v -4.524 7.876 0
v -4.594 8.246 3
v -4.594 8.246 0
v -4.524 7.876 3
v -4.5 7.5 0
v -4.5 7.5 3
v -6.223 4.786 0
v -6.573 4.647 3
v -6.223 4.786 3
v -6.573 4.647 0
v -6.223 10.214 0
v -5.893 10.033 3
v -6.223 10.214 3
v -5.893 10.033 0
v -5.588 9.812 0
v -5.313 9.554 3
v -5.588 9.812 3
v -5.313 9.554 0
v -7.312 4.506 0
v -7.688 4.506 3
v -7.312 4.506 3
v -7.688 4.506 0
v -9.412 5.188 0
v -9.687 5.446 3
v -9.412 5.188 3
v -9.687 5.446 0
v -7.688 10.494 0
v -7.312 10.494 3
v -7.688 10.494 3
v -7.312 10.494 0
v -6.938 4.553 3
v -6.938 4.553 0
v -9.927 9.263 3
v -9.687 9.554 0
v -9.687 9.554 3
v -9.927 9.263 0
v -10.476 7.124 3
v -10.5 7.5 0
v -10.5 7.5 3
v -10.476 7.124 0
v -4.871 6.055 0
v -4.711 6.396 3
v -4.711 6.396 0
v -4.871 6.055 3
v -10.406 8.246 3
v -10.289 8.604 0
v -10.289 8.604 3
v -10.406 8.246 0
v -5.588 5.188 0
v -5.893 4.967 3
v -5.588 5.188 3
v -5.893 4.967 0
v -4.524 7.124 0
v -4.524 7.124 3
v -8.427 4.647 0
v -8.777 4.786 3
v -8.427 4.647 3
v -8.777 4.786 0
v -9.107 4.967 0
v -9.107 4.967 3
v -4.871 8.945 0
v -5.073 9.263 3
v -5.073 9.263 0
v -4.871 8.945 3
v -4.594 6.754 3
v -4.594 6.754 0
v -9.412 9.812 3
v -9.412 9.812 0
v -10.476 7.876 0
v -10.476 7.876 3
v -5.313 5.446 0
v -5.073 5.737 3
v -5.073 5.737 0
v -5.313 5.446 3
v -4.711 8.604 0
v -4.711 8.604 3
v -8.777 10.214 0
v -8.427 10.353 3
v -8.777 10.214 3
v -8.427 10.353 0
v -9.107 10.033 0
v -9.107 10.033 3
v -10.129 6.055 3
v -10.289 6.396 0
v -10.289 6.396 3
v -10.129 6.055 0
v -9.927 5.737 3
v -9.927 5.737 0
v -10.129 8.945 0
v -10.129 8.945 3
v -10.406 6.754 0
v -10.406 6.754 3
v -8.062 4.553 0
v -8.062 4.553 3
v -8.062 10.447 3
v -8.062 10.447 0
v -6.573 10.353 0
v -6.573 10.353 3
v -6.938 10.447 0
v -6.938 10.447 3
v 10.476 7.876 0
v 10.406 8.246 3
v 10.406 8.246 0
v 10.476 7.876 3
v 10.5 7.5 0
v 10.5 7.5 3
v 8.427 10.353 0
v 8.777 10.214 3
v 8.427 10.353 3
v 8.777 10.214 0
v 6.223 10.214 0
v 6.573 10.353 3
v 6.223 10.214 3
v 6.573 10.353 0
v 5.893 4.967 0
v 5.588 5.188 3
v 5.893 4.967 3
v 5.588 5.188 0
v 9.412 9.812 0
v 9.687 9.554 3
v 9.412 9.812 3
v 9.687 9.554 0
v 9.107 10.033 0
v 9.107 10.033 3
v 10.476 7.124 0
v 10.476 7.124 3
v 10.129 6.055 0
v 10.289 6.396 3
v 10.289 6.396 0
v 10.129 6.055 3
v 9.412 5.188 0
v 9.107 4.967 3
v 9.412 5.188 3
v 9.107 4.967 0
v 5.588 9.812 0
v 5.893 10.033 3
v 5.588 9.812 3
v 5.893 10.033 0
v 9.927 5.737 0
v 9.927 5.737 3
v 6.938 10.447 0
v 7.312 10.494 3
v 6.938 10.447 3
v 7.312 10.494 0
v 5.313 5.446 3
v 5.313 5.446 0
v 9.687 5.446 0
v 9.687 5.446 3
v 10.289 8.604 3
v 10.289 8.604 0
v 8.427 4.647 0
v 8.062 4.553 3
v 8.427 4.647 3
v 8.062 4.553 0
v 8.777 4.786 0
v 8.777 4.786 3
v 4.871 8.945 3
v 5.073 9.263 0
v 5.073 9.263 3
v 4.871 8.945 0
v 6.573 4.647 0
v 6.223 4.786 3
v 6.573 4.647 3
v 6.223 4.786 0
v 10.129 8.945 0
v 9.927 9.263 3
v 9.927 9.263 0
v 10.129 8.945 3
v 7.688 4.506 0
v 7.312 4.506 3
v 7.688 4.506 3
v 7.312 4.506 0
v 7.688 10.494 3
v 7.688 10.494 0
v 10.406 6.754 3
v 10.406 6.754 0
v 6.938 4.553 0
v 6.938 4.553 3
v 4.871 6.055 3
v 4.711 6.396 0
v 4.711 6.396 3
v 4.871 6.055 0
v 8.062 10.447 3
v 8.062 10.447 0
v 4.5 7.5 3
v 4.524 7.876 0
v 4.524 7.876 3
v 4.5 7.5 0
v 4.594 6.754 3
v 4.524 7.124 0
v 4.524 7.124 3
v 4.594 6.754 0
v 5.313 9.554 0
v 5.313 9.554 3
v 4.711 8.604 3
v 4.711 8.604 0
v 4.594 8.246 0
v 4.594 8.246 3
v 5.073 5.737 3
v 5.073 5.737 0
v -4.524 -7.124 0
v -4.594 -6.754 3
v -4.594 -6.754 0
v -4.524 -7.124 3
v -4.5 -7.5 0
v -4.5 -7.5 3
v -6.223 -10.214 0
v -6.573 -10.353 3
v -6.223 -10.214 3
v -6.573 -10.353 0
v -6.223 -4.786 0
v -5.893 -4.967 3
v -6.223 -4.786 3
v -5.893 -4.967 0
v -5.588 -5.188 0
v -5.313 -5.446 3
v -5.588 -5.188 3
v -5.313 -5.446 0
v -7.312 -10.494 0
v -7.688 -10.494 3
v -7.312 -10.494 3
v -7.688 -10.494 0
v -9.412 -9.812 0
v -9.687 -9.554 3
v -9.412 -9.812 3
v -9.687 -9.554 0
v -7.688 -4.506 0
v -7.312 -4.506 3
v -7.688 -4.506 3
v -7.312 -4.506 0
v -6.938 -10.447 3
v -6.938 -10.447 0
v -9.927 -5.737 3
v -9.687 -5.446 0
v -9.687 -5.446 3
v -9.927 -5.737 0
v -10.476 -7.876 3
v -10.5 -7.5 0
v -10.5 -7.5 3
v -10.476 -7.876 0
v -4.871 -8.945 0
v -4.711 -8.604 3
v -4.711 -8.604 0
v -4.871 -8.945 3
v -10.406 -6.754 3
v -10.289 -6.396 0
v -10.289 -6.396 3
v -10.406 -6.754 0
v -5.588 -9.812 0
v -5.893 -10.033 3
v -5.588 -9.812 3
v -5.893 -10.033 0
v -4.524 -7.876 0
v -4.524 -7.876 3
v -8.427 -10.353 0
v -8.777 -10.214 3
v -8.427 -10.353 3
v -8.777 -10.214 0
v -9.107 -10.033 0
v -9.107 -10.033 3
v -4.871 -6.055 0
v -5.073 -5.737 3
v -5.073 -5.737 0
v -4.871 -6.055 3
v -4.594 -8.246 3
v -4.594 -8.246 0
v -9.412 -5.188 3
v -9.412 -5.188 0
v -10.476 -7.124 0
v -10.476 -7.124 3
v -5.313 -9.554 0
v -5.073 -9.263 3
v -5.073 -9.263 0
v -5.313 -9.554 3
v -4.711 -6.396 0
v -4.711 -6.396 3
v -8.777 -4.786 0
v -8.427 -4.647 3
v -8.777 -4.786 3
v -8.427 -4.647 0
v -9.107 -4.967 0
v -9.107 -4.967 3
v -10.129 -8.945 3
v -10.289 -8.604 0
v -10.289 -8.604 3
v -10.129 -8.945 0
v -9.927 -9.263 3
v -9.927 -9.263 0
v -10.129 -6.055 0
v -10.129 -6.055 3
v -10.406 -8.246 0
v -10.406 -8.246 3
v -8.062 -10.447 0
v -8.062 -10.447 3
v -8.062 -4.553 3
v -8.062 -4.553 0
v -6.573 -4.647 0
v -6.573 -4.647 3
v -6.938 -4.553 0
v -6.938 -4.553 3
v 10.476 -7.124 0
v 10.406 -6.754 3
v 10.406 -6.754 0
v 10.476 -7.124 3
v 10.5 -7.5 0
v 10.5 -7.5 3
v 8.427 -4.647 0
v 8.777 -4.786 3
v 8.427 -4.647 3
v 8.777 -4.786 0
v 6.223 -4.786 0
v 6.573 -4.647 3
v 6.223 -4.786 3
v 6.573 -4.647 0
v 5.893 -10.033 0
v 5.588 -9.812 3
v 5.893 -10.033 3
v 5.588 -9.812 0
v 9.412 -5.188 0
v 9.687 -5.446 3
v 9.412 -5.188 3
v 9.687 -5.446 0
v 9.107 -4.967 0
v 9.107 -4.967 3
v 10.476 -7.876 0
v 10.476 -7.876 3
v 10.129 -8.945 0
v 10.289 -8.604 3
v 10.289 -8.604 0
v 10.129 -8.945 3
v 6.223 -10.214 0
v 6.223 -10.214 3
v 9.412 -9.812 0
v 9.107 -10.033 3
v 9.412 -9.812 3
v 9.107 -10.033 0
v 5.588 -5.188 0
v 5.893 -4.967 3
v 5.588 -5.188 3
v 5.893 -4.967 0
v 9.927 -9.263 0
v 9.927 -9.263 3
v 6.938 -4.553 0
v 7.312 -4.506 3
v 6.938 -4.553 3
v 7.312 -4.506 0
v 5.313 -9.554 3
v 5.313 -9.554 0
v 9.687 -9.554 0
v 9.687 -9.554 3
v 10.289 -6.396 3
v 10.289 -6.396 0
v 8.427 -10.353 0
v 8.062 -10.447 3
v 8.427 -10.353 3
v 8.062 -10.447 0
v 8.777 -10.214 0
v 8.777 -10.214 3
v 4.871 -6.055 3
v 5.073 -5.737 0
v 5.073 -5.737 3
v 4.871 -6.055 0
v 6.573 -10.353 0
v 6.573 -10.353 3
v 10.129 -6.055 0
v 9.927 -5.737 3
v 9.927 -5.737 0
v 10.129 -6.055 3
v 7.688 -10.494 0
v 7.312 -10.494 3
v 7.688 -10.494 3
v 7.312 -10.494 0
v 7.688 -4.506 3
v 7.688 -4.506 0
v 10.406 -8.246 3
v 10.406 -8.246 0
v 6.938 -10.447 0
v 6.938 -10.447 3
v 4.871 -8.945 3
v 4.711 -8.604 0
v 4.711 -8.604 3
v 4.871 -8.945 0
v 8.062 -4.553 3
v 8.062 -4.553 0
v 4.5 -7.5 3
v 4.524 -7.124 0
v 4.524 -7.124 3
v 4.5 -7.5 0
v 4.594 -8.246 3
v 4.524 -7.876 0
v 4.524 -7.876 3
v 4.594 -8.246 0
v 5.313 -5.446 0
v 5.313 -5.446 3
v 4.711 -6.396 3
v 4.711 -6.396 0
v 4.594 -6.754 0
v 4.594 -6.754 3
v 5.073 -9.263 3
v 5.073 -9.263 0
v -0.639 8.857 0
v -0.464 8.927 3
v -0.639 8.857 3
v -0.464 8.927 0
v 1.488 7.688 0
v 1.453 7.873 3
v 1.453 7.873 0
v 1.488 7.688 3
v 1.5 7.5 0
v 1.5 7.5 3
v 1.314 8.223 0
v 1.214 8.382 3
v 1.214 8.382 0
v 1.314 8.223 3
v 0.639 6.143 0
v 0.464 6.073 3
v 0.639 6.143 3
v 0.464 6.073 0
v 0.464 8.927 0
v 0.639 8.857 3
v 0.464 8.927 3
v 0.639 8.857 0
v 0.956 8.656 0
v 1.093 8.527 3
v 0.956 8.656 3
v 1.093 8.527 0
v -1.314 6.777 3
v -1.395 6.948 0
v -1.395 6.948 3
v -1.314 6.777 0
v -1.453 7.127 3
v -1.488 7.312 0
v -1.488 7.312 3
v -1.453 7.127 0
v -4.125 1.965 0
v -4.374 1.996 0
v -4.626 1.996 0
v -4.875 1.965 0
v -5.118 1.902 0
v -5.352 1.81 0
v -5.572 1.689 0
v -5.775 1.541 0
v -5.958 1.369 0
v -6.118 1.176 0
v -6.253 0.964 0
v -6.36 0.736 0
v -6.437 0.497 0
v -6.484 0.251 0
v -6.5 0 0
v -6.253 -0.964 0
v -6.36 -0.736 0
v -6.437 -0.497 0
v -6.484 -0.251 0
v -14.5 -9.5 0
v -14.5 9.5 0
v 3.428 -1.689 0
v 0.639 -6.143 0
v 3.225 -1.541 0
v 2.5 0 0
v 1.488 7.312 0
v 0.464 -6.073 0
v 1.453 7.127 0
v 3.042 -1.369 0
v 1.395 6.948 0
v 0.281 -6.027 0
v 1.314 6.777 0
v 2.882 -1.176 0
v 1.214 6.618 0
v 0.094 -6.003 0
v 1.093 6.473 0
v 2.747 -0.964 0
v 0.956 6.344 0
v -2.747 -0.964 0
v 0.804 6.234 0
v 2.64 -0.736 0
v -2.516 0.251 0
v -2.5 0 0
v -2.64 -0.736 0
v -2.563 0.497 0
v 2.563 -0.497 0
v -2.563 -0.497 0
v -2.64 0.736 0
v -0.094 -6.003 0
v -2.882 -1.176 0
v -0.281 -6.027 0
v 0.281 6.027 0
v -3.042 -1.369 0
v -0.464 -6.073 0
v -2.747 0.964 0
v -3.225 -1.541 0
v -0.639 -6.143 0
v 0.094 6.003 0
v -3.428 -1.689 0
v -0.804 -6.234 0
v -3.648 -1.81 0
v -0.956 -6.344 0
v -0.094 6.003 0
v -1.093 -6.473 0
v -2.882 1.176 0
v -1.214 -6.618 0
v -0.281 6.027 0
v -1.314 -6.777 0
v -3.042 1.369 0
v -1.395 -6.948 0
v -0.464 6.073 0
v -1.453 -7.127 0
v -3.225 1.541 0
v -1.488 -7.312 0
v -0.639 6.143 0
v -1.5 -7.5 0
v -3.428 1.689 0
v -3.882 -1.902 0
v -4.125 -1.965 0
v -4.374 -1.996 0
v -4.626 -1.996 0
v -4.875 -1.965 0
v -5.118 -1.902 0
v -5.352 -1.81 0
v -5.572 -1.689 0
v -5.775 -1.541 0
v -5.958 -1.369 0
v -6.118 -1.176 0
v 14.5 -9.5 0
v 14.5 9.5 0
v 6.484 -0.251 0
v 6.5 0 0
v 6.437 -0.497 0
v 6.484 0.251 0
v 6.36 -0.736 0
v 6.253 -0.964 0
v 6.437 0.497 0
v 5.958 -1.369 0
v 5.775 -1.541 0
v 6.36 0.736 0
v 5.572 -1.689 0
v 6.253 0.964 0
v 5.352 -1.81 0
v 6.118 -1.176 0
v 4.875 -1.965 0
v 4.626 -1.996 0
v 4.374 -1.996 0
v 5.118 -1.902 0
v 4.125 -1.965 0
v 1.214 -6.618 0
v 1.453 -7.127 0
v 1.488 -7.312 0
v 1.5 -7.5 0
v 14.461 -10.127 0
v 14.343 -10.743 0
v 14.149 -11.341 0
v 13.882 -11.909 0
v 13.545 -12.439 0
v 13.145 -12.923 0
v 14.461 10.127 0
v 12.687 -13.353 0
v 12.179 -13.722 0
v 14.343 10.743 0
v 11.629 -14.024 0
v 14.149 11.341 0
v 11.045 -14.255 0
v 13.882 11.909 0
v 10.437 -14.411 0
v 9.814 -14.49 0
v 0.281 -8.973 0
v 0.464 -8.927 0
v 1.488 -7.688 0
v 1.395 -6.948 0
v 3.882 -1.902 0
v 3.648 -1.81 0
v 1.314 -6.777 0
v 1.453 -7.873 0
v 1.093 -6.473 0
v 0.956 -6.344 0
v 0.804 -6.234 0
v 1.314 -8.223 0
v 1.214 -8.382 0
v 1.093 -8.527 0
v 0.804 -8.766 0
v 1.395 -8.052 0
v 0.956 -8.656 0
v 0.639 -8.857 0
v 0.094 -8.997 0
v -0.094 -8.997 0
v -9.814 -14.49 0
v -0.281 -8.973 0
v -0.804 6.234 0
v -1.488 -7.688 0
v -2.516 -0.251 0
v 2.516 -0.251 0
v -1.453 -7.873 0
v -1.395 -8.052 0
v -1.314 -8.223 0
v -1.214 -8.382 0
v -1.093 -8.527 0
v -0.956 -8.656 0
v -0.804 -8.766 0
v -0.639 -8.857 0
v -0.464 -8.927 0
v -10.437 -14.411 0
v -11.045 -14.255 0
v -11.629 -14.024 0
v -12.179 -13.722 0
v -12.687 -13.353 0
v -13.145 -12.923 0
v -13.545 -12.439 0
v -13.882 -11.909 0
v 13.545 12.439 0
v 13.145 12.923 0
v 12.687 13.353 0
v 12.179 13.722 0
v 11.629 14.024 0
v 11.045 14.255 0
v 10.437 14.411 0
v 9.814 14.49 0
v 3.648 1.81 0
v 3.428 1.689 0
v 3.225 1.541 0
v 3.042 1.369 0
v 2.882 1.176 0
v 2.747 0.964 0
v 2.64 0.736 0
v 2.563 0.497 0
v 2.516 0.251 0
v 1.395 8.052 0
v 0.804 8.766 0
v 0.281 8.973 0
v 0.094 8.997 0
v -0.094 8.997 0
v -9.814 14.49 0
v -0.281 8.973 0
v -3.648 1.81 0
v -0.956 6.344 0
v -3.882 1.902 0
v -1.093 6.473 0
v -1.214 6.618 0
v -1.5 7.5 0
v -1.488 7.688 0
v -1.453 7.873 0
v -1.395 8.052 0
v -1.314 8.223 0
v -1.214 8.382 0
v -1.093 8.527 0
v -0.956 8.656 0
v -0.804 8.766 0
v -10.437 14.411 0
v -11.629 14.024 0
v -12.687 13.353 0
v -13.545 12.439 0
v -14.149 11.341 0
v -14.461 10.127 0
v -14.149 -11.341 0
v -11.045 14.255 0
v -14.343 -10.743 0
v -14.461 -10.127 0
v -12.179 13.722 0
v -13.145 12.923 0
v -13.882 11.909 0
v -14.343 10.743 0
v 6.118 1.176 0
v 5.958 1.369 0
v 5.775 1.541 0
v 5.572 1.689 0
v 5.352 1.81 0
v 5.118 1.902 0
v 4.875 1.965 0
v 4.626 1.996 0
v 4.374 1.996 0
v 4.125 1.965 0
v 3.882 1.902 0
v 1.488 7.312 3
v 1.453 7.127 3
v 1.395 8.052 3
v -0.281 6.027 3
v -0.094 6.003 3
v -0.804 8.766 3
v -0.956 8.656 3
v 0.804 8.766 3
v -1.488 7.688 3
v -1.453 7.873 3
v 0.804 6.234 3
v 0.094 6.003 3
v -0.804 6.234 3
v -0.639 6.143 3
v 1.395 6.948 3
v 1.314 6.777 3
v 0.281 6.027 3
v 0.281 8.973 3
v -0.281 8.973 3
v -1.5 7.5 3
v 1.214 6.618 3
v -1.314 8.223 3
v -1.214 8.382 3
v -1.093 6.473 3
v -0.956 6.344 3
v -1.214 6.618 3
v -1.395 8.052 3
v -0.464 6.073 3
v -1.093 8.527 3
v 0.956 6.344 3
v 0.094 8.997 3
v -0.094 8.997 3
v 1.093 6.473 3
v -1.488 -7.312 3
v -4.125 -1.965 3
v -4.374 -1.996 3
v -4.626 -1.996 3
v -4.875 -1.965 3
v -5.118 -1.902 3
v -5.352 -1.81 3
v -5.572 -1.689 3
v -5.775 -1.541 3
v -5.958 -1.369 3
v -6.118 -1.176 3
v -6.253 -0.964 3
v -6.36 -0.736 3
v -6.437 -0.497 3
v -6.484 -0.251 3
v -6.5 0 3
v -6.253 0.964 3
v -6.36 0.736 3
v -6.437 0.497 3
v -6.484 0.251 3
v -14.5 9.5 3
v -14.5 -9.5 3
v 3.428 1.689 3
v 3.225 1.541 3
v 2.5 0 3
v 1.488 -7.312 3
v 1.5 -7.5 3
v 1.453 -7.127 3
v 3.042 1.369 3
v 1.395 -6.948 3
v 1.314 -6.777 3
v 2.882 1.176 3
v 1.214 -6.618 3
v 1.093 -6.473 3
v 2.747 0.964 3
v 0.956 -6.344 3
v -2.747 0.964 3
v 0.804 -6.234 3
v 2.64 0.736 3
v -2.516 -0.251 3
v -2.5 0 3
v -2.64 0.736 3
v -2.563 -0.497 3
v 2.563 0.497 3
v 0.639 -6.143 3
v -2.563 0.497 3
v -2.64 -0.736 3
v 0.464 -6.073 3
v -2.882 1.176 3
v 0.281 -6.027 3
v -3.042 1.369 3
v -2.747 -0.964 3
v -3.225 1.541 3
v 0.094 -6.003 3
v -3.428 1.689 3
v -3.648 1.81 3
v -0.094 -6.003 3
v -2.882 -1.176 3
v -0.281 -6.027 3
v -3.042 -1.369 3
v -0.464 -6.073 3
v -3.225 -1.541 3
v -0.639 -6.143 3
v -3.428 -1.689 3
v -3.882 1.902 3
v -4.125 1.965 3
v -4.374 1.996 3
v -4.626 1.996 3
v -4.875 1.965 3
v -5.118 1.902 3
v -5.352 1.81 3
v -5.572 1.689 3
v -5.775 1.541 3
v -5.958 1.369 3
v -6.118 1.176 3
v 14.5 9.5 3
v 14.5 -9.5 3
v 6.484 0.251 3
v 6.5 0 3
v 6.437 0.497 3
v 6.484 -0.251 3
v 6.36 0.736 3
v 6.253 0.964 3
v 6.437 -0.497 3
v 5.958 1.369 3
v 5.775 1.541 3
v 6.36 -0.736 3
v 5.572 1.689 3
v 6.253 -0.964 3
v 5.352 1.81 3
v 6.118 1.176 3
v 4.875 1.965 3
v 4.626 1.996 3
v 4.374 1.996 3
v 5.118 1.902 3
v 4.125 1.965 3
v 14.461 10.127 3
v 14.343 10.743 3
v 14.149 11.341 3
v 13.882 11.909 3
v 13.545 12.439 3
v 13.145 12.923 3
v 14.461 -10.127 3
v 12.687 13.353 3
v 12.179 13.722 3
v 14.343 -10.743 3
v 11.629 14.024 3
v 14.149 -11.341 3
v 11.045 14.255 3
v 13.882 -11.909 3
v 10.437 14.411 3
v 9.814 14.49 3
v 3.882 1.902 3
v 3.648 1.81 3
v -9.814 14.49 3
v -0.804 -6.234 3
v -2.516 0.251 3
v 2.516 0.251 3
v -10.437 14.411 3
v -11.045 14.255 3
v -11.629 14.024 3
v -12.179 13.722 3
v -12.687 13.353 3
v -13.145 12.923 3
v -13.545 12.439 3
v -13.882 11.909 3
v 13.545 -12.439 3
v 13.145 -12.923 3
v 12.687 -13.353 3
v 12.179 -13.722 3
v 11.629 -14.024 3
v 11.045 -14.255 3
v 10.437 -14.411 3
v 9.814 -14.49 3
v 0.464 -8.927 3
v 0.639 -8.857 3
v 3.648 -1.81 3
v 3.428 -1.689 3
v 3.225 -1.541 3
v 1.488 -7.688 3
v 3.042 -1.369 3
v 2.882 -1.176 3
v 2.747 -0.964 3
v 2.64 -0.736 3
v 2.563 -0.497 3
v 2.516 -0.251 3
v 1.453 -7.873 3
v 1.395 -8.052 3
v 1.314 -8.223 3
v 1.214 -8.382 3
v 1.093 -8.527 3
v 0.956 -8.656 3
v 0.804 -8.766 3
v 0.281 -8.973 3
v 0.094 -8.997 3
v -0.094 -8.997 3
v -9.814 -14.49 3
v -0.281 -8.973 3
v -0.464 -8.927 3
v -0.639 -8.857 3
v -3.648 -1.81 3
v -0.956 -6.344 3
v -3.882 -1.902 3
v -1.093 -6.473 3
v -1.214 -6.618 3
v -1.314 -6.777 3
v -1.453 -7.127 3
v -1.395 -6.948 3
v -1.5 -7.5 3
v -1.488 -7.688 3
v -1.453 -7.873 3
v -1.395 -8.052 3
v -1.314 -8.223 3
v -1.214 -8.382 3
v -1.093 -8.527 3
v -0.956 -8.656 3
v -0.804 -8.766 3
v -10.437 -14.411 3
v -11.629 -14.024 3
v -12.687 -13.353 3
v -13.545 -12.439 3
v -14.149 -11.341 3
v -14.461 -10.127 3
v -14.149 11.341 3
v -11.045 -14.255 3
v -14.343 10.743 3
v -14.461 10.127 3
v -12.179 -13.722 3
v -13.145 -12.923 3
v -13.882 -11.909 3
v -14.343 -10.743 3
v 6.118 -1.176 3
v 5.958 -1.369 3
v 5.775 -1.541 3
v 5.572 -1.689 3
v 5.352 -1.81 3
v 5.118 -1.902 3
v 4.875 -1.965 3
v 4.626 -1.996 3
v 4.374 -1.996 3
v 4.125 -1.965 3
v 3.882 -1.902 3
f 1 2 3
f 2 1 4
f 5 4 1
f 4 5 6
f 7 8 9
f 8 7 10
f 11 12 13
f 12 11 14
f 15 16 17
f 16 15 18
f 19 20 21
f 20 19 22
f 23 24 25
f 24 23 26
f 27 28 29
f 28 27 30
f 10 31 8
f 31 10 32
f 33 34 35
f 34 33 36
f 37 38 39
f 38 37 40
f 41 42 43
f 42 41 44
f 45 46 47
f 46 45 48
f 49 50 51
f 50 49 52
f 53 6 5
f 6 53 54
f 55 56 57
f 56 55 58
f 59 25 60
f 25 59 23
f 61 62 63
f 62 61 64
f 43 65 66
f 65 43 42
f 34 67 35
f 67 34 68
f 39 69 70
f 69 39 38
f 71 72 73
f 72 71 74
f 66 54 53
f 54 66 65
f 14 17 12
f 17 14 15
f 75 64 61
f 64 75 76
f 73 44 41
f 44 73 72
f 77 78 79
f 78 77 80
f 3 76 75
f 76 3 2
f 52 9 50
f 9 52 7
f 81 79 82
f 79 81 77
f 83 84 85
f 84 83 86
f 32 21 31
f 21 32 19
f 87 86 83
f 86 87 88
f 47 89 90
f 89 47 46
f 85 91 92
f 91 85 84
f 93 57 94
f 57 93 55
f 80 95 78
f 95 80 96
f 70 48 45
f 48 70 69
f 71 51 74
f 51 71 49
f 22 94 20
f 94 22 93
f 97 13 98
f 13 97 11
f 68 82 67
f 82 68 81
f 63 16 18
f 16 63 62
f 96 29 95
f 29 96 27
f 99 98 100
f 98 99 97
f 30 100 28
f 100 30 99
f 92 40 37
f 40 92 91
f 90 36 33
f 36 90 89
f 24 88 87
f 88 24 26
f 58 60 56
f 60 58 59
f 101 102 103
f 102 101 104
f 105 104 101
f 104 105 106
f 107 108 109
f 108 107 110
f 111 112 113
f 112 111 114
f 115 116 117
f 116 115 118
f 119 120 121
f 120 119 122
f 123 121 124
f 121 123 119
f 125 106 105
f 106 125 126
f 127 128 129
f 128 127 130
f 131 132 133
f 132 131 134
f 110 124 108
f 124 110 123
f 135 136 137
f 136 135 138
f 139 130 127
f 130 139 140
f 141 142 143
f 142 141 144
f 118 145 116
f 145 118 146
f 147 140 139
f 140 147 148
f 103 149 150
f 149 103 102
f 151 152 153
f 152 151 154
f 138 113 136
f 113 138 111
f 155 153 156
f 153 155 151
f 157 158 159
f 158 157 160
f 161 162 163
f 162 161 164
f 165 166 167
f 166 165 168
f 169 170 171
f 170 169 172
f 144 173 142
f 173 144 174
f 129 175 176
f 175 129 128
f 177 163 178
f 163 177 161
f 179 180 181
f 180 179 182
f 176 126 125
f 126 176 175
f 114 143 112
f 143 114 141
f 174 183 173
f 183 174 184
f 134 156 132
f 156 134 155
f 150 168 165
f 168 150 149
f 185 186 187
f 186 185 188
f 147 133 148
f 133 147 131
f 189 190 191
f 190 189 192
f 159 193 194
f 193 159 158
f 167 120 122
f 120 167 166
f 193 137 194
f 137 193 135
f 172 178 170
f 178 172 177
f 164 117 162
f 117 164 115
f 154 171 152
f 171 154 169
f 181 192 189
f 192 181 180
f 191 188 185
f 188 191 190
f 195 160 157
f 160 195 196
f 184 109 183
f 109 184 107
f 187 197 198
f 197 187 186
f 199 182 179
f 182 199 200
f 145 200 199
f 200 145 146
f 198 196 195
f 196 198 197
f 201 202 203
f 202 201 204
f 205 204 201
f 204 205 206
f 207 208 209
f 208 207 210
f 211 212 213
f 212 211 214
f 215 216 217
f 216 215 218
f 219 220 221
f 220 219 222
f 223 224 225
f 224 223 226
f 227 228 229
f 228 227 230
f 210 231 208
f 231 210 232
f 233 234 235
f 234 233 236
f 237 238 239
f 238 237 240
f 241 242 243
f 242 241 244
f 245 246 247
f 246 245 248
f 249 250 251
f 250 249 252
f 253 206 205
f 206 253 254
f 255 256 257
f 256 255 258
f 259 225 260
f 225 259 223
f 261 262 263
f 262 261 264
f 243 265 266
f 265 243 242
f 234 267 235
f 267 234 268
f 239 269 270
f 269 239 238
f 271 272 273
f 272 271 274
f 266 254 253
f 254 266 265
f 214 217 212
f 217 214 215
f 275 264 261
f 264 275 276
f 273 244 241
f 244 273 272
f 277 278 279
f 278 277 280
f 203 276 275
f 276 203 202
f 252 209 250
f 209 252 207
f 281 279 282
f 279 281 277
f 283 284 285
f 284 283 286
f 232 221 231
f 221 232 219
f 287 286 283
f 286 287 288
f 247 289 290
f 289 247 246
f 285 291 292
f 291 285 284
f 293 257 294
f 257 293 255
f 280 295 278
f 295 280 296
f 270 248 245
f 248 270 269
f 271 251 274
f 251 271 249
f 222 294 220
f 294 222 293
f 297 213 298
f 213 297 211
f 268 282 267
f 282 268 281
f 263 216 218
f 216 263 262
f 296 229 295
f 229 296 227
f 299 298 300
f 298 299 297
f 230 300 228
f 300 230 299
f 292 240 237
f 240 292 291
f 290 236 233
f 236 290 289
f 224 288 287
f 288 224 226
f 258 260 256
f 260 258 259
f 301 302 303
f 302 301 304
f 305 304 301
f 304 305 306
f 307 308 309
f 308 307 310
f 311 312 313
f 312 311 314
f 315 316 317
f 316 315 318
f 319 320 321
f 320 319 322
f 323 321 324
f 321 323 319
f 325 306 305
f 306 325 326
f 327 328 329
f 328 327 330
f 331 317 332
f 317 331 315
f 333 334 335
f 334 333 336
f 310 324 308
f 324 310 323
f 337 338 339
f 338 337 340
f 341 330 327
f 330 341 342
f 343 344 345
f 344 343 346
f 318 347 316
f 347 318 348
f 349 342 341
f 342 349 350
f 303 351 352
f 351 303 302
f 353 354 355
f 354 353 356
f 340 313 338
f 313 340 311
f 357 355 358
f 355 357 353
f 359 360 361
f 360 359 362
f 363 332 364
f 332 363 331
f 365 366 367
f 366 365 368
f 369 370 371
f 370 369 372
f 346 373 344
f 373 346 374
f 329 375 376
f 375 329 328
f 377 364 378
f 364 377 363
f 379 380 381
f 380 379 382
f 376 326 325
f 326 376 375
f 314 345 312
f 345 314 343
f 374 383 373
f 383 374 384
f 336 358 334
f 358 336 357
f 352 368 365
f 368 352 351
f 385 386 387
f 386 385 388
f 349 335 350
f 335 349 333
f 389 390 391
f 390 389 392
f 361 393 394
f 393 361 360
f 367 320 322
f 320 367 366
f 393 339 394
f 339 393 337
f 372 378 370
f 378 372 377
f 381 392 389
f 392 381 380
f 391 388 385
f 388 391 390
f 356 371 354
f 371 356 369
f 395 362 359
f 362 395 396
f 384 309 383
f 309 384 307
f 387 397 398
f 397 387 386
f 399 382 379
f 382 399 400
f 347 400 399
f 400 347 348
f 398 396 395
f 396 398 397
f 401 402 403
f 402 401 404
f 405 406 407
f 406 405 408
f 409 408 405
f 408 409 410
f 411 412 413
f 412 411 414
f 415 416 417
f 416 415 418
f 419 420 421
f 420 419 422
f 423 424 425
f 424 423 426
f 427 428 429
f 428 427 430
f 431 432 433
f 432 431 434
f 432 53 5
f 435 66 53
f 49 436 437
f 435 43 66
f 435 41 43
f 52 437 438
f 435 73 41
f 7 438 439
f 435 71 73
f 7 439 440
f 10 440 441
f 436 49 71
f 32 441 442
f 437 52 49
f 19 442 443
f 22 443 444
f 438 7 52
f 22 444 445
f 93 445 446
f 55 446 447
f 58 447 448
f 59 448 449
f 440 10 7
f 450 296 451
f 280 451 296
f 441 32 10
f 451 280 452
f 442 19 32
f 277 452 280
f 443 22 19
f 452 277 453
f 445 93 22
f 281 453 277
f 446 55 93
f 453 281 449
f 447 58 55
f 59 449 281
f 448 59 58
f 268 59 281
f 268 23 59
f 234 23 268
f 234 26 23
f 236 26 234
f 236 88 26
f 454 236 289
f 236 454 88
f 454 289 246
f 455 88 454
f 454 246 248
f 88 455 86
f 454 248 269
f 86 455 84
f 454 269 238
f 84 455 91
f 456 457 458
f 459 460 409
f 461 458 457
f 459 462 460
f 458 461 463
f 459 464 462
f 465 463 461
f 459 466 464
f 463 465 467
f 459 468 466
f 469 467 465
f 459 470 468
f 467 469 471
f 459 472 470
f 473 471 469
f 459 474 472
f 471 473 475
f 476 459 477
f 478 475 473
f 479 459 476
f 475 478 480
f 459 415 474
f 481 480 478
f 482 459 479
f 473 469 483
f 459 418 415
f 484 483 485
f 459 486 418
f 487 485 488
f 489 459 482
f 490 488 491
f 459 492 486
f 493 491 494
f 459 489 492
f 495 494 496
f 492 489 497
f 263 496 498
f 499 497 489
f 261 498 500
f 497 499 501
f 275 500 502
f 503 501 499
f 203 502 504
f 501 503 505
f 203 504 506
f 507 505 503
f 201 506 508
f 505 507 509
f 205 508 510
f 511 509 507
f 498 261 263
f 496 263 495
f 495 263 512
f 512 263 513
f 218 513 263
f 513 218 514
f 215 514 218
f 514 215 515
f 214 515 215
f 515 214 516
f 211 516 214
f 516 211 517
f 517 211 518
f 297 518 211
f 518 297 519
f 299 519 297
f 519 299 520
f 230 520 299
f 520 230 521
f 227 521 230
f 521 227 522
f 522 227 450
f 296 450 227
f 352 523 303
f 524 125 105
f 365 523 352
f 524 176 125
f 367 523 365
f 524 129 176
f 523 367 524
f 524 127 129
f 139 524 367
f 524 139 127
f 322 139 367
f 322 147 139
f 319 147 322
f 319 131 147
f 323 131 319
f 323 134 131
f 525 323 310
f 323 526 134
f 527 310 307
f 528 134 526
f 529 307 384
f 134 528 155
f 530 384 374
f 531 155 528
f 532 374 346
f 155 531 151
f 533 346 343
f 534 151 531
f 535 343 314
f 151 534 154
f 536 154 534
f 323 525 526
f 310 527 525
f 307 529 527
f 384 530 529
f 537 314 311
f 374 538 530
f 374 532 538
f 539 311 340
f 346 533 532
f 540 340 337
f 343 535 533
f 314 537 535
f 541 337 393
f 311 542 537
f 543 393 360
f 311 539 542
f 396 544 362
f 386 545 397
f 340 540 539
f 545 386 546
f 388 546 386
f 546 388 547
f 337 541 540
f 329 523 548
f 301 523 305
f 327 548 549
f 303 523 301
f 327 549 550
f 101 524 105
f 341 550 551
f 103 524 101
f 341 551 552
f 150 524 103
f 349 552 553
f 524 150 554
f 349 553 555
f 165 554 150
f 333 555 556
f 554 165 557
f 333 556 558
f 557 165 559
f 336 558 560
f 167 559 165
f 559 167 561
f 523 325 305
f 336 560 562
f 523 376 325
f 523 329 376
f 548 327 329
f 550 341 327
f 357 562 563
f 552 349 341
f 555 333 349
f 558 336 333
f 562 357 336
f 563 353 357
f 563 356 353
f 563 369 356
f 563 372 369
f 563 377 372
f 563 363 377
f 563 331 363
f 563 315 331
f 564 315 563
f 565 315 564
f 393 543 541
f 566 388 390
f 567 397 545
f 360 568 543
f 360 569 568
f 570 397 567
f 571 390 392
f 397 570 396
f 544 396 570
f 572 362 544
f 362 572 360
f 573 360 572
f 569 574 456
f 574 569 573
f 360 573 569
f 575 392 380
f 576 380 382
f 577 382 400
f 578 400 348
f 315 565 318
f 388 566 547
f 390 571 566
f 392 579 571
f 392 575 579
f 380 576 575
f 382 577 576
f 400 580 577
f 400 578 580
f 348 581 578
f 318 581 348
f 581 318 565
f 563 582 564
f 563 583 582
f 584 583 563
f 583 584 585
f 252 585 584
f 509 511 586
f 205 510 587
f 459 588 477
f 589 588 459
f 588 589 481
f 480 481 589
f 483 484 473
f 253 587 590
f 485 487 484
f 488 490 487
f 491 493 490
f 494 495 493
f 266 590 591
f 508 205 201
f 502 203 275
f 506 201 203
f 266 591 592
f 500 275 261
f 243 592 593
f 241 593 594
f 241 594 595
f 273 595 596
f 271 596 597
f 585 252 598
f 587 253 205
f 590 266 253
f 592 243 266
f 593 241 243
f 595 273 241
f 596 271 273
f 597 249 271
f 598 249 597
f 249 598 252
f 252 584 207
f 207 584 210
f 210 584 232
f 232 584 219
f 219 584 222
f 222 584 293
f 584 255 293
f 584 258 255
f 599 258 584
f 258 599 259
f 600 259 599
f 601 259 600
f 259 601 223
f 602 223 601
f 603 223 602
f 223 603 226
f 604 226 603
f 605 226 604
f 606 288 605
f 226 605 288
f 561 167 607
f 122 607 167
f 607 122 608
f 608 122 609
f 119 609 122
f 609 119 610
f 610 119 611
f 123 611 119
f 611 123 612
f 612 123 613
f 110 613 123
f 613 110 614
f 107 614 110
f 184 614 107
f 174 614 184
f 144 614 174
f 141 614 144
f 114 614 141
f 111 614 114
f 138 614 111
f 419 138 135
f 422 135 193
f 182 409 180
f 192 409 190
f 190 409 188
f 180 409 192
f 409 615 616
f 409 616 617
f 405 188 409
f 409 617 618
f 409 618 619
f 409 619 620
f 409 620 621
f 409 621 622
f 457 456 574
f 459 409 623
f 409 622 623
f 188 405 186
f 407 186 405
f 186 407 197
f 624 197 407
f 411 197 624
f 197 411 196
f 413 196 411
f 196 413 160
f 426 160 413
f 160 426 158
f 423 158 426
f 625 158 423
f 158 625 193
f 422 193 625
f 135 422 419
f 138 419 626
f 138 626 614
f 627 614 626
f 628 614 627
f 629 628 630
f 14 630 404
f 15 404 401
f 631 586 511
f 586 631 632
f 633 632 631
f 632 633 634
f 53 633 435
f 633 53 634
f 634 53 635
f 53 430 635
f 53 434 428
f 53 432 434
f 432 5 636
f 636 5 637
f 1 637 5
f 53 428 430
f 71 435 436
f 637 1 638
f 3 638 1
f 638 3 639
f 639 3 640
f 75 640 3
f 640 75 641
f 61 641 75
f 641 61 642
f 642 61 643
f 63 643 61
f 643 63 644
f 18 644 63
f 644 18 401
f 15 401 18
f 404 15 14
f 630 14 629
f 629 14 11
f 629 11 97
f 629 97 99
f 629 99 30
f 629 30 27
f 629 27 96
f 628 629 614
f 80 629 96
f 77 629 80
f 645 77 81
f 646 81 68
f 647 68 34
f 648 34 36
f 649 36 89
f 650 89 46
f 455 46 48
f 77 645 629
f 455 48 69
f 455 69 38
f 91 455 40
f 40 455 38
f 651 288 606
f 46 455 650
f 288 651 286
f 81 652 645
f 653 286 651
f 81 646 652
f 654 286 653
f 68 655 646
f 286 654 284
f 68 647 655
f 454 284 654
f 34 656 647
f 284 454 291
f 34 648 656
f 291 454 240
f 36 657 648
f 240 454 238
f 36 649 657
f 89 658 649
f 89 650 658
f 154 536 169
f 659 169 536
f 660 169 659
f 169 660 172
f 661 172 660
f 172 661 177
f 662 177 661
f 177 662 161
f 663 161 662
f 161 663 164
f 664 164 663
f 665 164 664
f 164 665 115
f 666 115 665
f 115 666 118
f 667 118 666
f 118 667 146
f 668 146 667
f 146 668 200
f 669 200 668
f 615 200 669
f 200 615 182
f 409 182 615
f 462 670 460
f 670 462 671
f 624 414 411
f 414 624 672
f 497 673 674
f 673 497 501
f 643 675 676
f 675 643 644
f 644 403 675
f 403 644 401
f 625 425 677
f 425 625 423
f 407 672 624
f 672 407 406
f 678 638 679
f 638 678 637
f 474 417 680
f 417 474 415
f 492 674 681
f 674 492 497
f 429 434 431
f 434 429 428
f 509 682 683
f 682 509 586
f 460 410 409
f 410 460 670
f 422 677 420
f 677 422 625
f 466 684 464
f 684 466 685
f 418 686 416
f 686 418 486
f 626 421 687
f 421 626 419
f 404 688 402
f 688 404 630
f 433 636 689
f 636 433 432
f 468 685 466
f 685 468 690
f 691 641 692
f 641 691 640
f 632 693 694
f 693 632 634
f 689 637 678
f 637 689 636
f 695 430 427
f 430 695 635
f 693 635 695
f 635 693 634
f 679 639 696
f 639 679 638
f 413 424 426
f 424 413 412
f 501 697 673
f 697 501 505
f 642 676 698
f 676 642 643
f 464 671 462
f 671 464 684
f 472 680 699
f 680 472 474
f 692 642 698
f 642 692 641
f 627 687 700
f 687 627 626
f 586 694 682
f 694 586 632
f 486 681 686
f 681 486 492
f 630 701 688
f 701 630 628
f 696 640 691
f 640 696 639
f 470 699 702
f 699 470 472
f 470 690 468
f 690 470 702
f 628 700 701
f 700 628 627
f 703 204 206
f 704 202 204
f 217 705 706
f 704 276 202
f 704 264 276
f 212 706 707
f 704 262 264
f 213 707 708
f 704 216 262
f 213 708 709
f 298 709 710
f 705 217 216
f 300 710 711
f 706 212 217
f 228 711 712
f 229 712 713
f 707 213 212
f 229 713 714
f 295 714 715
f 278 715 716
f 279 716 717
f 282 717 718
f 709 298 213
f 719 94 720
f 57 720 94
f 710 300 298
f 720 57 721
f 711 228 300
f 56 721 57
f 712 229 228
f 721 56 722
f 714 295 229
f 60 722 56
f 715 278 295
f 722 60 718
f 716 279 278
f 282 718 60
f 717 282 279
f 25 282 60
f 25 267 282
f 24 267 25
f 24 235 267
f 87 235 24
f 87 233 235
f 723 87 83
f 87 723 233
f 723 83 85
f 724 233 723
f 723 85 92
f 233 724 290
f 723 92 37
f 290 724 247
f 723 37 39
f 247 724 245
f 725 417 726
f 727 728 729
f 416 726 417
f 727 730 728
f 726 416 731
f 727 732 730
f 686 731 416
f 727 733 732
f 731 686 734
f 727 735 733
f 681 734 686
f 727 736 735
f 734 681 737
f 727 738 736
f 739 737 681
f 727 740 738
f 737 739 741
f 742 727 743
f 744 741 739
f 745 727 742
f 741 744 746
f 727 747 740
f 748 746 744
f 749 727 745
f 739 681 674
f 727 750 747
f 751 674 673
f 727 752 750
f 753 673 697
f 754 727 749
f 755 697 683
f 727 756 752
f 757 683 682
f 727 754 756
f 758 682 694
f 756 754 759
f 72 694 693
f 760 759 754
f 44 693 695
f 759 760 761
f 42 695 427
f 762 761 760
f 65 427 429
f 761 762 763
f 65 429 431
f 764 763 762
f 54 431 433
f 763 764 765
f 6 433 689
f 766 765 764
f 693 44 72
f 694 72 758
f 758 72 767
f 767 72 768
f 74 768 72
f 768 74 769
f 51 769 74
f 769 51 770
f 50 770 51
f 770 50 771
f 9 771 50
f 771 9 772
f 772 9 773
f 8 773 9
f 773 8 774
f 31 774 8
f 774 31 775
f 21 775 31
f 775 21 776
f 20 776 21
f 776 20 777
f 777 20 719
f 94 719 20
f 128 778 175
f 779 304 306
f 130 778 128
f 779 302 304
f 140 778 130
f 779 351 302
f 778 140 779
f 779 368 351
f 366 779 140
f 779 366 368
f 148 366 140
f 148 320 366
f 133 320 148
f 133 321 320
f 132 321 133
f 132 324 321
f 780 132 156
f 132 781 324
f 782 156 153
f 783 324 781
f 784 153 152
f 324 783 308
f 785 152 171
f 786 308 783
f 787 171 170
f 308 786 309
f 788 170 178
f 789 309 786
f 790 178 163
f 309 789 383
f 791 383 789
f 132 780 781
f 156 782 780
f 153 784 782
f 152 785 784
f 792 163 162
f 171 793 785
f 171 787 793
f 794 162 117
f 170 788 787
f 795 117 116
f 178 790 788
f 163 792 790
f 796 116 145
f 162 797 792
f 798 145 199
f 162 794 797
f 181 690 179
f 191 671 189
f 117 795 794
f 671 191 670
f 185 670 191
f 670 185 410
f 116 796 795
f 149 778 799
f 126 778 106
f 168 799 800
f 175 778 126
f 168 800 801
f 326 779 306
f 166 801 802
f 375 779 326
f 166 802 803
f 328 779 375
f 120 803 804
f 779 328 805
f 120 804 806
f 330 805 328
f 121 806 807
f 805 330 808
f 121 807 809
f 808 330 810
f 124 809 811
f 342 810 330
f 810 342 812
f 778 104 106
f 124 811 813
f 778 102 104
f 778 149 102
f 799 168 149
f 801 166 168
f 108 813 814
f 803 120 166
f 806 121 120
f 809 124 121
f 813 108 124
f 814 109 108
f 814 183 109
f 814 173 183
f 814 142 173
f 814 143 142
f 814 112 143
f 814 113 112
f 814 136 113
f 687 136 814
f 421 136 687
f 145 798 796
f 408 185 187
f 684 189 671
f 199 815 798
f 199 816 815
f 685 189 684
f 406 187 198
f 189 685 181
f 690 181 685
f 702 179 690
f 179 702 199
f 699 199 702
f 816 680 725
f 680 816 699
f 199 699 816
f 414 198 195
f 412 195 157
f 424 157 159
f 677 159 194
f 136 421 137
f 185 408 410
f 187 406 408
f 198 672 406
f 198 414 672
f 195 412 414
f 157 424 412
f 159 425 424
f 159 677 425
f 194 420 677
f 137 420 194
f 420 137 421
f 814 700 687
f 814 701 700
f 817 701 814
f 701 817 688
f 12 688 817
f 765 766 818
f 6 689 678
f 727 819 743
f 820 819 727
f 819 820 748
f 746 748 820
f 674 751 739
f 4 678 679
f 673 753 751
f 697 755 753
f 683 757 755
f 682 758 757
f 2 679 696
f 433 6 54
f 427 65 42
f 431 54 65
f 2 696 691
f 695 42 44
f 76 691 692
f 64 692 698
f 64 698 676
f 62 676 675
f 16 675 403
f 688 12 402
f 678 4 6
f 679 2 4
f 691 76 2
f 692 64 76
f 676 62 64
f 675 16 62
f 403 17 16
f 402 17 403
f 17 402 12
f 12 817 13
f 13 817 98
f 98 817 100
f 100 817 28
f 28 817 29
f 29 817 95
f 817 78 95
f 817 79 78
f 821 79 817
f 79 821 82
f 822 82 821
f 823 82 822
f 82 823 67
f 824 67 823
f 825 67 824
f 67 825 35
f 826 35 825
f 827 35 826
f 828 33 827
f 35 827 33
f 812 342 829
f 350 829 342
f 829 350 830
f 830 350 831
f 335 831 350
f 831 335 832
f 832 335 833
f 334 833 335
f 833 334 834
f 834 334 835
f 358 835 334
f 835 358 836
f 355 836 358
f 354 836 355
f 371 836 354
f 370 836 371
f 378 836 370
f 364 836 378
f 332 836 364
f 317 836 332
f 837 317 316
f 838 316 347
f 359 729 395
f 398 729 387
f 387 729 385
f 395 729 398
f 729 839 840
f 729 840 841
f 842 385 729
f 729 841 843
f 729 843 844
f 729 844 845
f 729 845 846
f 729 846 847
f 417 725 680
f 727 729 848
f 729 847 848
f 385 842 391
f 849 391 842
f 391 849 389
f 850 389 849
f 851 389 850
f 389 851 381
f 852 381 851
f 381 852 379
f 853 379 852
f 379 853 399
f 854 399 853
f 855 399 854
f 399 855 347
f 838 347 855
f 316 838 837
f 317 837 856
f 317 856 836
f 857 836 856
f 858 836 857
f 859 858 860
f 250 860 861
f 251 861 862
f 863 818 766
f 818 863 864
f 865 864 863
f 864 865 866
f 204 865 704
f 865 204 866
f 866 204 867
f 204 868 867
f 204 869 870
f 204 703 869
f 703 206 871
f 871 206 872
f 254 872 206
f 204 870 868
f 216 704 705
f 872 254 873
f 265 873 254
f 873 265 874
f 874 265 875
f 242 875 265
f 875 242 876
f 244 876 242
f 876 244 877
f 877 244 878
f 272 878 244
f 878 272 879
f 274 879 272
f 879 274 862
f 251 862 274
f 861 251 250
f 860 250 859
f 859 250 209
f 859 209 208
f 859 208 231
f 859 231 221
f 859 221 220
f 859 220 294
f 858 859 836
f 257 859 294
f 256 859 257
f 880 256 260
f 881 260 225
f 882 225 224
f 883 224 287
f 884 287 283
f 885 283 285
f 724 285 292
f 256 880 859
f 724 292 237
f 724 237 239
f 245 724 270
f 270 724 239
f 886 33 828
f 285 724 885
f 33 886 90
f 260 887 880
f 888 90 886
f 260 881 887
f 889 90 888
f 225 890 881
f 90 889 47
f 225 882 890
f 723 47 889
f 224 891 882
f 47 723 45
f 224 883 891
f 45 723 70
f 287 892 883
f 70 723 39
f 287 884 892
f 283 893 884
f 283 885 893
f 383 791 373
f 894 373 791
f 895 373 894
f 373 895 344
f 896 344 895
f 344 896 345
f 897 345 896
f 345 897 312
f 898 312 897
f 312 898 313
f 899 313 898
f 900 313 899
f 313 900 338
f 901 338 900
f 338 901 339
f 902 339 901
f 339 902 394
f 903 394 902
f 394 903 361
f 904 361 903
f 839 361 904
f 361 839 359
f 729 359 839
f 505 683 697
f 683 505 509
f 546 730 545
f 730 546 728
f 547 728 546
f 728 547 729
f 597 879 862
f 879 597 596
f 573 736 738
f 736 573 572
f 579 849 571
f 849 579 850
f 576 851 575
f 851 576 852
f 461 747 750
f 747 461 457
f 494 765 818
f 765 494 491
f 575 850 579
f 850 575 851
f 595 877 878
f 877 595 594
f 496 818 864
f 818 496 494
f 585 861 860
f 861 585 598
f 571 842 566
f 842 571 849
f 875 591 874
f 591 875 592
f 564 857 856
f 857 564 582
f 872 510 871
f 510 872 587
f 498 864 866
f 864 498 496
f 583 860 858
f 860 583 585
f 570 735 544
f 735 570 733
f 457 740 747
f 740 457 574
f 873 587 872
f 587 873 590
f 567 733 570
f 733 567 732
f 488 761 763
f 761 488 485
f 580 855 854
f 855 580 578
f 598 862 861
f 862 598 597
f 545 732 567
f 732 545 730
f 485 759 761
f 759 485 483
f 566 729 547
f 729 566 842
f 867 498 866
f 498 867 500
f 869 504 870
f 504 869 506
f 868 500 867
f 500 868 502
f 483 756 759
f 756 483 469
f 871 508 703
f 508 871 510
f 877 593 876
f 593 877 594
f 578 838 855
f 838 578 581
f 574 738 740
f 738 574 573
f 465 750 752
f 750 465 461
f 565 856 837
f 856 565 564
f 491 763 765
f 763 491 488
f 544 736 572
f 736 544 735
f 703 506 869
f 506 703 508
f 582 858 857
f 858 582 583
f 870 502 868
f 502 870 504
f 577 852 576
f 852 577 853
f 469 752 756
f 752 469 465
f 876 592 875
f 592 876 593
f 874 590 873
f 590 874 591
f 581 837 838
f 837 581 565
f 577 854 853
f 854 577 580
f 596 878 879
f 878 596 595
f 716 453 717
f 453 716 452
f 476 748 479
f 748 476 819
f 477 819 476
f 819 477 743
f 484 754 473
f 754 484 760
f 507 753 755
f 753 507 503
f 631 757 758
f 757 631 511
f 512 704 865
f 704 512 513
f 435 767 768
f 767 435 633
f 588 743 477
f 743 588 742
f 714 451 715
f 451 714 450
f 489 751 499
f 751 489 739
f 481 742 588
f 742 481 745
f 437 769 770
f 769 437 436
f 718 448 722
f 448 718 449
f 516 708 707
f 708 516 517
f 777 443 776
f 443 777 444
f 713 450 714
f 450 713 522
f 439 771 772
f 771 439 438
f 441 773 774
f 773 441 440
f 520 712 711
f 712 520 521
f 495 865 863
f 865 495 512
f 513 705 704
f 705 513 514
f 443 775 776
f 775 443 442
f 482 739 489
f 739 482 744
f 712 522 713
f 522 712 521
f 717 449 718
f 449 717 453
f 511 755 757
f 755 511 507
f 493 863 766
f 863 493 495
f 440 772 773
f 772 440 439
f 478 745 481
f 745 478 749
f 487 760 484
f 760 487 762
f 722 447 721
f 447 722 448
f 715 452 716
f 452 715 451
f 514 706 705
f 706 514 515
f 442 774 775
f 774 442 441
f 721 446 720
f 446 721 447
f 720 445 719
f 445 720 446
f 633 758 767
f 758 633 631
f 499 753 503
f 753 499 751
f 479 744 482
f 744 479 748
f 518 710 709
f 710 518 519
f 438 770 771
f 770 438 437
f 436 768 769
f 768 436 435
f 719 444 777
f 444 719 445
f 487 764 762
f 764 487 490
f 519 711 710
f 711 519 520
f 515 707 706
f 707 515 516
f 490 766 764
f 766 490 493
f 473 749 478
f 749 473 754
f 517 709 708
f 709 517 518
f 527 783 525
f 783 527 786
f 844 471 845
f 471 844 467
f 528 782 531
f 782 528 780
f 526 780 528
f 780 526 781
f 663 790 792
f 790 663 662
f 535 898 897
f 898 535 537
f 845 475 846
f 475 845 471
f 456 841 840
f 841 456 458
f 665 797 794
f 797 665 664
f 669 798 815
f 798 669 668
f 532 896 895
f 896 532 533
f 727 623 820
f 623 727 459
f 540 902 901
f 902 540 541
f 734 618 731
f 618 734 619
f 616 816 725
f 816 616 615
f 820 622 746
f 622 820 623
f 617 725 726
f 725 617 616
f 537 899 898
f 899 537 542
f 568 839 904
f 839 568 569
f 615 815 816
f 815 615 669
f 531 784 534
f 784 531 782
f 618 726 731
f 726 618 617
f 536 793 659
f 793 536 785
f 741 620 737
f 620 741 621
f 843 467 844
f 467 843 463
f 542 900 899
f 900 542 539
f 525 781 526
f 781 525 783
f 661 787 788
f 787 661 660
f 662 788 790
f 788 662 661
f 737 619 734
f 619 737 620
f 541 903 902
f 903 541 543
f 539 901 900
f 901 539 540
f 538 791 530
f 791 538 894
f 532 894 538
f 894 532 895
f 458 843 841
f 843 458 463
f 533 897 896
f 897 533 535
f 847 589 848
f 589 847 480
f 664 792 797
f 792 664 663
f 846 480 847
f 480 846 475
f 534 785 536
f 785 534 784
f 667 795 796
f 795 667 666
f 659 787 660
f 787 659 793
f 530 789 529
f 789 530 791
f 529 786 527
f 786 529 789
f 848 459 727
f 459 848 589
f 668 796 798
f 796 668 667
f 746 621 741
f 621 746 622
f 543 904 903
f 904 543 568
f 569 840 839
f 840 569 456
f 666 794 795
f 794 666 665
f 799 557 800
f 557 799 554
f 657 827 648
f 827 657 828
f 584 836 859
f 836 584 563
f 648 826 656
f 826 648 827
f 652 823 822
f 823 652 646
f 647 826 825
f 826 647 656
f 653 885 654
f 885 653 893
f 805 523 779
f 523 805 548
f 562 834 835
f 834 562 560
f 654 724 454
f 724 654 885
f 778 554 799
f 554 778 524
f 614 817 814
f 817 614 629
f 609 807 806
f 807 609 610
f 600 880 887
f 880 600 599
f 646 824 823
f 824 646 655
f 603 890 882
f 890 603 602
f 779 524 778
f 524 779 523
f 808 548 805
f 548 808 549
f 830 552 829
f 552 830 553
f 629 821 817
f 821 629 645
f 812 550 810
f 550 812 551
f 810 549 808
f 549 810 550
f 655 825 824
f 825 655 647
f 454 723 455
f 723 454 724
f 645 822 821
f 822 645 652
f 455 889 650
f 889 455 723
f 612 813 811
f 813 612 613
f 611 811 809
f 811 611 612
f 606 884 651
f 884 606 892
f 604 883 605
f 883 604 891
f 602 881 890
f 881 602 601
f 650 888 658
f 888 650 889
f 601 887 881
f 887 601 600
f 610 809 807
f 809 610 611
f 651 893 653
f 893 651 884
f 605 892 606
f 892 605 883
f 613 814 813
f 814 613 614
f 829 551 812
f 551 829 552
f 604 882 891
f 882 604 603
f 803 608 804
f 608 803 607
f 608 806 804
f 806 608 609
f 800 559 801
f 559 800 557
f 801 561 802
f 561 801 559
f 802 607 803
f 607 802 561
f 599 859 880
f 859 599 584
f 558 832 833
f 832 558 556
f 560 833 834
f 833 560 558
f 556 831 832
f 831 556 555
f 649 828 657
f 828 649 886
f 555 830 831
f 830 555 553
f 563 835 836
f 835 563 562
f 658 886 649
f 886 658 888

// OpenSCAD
$fn = 50;


difference() {
	union() {
		hull() {
			translate(v = [-9.5000000000, 9.5000000000, 0]) {
				cylinder(h = 3, r = 5);
			}
			translate(v = [9.5000000000, 9.5000000000, 0]) {
				cylinder(h = 3, r = 5);
			}
			translate(v = [-9.5000000000, -9.5000000000, 0]) {
				cylinder(h = 3, r = 5);
			}
			translate(v = [9.5000000000, -9.5000000000, 0]) {
				cylinder(h = 3, r = 5);
			}
		}
	}
	union() {
		#translate(v = [-7.5000000000, 7.5000000000, 0]) {
			cylinder(h = 3, r = 3.0000000000);
		}
		#translate(v = [7.5000000000, 7.5000000000, 0]) {
			cylinder(h = 3, r = 3.0000000000);
		}
		#translate(v = [-7.5000000000, -7.5000000000, 0]) {
			cylinder(h = 3, r = 3.0000000000);
		}
		#translate(v = [7.5000000000, -7.5000000000, 0]) {
			cylinder(h = 3, r = 3.0000000000);
		}
		#translate(v = [-7.5000000000, -7.5000000000, -100.0000000000]) {
			cylinder(h = 200, r = 3.0000000000);
		}
		#translate(v = [-7.5000000000, 7.5000000000, -100.0000000000]) {
			cylinder(h = 200, r = 3.0000000000);
		}
		#translate(v = [7.5000000000, -7.5000000000, -100.0000000000]) {
			cylinder(h = 200, r = 3.0000000000);
		}
		#translate(v = [7.5000000000, 7.5000000000, -100.0000000000]) {
			cylinder(h = 200, r = 3.0000000000);
		}
		#translate(v = [-7.5000000000, 7.5000000000, 0]) {
			cylinder(h = 3, r = 1.5000000000);
		}
		#translate(v = [0.0000000000, 7.5000000000, 0]) {
			cylinder(h = 3, r = 1.5000000000);
		}
		#translate(v = [7.5000000000, 7.5000000000, 0]) {
			cylinder(h = 3, r = 1.5000000000);
		}
		#translate(v = [-7.5000000000, -7.5000000000, 0]) {
			cylinder(h = 3, r = 1.5000000000);
		}
		#translate(v = [0.0000000000, -7.5000000000, 0]) {
			cylinder(h = 3, r = 1.5000000000);
		}
		#translate(v = [7.5000000000, -7.5000000000, 0]) {
			cylinder(h = 3, r = 1.5000000000);
		}
		#translate(v = [-7.5000000000, 7.5000000000, 0]) {
			cylinder(h = 3, r = 1.5000000000);
		}
		#translate(v = [0.0000000000, 7.5000000000, 0]) {
			cylinder(h = 3, r = 1.5000000000);
		}
		#translate(v = [7.5000000000, 7.5000000000, 0]) {
			cylinder(h = 3, r = 1.5000000000);
		}
		#translate(v = [-7.5000000000, -7.5000000000, 0]) {
			cylinder(h = 3, r = 1.5000000000);
		}
		#translate(v = [0.0000000000, -7.5000000000, 0]) {
			cylinder(h = 3, r = 1.5000000000);
		}
		#translate(v = [7.5000000000, -7.5000000000, 0]) {
			cylinder(h = 3, r = 1.5000000000);
		}
		#translate(v = [-7.5000000000, 7.5000000000, 0]) {
			cylinder(h = 3, r = 1.5000000000);
		}
		#translate(v = [0.0000000000, 7.5000000000, 0]) {
			cylinder(h = 3, r = 1.5000000000);
		}
		#translate(v = [7.5000000000, 7.5000000000, 0]) {
			cylinder(h = 3, r = 1.5000000000);
		}
		#translate(v = [-7.5000000000, -7.5000000000, 0]) {
			cylinder(h = 3, r = 1.5000000000);
		}
		#translate(v = [0.0000000000, -7.5000000000, 0]) {
			cylinder(h = 3, r = 1.5000000000);
		}
		#translate(v = [7.5000000000, -7.5000000000, 0]) {
			cylinder(h = 3, r = 1.5000000000);
		}
		#translate(v = [-4.5000000000, 0, 0]) {
			cylinder(h = 3, r = 2.0000000000);
		}
		#translate(v = [4.5000000000, 0, 0]) {
			cylinder(h = 3, r = 2.0000000000);
		}
	}
}
